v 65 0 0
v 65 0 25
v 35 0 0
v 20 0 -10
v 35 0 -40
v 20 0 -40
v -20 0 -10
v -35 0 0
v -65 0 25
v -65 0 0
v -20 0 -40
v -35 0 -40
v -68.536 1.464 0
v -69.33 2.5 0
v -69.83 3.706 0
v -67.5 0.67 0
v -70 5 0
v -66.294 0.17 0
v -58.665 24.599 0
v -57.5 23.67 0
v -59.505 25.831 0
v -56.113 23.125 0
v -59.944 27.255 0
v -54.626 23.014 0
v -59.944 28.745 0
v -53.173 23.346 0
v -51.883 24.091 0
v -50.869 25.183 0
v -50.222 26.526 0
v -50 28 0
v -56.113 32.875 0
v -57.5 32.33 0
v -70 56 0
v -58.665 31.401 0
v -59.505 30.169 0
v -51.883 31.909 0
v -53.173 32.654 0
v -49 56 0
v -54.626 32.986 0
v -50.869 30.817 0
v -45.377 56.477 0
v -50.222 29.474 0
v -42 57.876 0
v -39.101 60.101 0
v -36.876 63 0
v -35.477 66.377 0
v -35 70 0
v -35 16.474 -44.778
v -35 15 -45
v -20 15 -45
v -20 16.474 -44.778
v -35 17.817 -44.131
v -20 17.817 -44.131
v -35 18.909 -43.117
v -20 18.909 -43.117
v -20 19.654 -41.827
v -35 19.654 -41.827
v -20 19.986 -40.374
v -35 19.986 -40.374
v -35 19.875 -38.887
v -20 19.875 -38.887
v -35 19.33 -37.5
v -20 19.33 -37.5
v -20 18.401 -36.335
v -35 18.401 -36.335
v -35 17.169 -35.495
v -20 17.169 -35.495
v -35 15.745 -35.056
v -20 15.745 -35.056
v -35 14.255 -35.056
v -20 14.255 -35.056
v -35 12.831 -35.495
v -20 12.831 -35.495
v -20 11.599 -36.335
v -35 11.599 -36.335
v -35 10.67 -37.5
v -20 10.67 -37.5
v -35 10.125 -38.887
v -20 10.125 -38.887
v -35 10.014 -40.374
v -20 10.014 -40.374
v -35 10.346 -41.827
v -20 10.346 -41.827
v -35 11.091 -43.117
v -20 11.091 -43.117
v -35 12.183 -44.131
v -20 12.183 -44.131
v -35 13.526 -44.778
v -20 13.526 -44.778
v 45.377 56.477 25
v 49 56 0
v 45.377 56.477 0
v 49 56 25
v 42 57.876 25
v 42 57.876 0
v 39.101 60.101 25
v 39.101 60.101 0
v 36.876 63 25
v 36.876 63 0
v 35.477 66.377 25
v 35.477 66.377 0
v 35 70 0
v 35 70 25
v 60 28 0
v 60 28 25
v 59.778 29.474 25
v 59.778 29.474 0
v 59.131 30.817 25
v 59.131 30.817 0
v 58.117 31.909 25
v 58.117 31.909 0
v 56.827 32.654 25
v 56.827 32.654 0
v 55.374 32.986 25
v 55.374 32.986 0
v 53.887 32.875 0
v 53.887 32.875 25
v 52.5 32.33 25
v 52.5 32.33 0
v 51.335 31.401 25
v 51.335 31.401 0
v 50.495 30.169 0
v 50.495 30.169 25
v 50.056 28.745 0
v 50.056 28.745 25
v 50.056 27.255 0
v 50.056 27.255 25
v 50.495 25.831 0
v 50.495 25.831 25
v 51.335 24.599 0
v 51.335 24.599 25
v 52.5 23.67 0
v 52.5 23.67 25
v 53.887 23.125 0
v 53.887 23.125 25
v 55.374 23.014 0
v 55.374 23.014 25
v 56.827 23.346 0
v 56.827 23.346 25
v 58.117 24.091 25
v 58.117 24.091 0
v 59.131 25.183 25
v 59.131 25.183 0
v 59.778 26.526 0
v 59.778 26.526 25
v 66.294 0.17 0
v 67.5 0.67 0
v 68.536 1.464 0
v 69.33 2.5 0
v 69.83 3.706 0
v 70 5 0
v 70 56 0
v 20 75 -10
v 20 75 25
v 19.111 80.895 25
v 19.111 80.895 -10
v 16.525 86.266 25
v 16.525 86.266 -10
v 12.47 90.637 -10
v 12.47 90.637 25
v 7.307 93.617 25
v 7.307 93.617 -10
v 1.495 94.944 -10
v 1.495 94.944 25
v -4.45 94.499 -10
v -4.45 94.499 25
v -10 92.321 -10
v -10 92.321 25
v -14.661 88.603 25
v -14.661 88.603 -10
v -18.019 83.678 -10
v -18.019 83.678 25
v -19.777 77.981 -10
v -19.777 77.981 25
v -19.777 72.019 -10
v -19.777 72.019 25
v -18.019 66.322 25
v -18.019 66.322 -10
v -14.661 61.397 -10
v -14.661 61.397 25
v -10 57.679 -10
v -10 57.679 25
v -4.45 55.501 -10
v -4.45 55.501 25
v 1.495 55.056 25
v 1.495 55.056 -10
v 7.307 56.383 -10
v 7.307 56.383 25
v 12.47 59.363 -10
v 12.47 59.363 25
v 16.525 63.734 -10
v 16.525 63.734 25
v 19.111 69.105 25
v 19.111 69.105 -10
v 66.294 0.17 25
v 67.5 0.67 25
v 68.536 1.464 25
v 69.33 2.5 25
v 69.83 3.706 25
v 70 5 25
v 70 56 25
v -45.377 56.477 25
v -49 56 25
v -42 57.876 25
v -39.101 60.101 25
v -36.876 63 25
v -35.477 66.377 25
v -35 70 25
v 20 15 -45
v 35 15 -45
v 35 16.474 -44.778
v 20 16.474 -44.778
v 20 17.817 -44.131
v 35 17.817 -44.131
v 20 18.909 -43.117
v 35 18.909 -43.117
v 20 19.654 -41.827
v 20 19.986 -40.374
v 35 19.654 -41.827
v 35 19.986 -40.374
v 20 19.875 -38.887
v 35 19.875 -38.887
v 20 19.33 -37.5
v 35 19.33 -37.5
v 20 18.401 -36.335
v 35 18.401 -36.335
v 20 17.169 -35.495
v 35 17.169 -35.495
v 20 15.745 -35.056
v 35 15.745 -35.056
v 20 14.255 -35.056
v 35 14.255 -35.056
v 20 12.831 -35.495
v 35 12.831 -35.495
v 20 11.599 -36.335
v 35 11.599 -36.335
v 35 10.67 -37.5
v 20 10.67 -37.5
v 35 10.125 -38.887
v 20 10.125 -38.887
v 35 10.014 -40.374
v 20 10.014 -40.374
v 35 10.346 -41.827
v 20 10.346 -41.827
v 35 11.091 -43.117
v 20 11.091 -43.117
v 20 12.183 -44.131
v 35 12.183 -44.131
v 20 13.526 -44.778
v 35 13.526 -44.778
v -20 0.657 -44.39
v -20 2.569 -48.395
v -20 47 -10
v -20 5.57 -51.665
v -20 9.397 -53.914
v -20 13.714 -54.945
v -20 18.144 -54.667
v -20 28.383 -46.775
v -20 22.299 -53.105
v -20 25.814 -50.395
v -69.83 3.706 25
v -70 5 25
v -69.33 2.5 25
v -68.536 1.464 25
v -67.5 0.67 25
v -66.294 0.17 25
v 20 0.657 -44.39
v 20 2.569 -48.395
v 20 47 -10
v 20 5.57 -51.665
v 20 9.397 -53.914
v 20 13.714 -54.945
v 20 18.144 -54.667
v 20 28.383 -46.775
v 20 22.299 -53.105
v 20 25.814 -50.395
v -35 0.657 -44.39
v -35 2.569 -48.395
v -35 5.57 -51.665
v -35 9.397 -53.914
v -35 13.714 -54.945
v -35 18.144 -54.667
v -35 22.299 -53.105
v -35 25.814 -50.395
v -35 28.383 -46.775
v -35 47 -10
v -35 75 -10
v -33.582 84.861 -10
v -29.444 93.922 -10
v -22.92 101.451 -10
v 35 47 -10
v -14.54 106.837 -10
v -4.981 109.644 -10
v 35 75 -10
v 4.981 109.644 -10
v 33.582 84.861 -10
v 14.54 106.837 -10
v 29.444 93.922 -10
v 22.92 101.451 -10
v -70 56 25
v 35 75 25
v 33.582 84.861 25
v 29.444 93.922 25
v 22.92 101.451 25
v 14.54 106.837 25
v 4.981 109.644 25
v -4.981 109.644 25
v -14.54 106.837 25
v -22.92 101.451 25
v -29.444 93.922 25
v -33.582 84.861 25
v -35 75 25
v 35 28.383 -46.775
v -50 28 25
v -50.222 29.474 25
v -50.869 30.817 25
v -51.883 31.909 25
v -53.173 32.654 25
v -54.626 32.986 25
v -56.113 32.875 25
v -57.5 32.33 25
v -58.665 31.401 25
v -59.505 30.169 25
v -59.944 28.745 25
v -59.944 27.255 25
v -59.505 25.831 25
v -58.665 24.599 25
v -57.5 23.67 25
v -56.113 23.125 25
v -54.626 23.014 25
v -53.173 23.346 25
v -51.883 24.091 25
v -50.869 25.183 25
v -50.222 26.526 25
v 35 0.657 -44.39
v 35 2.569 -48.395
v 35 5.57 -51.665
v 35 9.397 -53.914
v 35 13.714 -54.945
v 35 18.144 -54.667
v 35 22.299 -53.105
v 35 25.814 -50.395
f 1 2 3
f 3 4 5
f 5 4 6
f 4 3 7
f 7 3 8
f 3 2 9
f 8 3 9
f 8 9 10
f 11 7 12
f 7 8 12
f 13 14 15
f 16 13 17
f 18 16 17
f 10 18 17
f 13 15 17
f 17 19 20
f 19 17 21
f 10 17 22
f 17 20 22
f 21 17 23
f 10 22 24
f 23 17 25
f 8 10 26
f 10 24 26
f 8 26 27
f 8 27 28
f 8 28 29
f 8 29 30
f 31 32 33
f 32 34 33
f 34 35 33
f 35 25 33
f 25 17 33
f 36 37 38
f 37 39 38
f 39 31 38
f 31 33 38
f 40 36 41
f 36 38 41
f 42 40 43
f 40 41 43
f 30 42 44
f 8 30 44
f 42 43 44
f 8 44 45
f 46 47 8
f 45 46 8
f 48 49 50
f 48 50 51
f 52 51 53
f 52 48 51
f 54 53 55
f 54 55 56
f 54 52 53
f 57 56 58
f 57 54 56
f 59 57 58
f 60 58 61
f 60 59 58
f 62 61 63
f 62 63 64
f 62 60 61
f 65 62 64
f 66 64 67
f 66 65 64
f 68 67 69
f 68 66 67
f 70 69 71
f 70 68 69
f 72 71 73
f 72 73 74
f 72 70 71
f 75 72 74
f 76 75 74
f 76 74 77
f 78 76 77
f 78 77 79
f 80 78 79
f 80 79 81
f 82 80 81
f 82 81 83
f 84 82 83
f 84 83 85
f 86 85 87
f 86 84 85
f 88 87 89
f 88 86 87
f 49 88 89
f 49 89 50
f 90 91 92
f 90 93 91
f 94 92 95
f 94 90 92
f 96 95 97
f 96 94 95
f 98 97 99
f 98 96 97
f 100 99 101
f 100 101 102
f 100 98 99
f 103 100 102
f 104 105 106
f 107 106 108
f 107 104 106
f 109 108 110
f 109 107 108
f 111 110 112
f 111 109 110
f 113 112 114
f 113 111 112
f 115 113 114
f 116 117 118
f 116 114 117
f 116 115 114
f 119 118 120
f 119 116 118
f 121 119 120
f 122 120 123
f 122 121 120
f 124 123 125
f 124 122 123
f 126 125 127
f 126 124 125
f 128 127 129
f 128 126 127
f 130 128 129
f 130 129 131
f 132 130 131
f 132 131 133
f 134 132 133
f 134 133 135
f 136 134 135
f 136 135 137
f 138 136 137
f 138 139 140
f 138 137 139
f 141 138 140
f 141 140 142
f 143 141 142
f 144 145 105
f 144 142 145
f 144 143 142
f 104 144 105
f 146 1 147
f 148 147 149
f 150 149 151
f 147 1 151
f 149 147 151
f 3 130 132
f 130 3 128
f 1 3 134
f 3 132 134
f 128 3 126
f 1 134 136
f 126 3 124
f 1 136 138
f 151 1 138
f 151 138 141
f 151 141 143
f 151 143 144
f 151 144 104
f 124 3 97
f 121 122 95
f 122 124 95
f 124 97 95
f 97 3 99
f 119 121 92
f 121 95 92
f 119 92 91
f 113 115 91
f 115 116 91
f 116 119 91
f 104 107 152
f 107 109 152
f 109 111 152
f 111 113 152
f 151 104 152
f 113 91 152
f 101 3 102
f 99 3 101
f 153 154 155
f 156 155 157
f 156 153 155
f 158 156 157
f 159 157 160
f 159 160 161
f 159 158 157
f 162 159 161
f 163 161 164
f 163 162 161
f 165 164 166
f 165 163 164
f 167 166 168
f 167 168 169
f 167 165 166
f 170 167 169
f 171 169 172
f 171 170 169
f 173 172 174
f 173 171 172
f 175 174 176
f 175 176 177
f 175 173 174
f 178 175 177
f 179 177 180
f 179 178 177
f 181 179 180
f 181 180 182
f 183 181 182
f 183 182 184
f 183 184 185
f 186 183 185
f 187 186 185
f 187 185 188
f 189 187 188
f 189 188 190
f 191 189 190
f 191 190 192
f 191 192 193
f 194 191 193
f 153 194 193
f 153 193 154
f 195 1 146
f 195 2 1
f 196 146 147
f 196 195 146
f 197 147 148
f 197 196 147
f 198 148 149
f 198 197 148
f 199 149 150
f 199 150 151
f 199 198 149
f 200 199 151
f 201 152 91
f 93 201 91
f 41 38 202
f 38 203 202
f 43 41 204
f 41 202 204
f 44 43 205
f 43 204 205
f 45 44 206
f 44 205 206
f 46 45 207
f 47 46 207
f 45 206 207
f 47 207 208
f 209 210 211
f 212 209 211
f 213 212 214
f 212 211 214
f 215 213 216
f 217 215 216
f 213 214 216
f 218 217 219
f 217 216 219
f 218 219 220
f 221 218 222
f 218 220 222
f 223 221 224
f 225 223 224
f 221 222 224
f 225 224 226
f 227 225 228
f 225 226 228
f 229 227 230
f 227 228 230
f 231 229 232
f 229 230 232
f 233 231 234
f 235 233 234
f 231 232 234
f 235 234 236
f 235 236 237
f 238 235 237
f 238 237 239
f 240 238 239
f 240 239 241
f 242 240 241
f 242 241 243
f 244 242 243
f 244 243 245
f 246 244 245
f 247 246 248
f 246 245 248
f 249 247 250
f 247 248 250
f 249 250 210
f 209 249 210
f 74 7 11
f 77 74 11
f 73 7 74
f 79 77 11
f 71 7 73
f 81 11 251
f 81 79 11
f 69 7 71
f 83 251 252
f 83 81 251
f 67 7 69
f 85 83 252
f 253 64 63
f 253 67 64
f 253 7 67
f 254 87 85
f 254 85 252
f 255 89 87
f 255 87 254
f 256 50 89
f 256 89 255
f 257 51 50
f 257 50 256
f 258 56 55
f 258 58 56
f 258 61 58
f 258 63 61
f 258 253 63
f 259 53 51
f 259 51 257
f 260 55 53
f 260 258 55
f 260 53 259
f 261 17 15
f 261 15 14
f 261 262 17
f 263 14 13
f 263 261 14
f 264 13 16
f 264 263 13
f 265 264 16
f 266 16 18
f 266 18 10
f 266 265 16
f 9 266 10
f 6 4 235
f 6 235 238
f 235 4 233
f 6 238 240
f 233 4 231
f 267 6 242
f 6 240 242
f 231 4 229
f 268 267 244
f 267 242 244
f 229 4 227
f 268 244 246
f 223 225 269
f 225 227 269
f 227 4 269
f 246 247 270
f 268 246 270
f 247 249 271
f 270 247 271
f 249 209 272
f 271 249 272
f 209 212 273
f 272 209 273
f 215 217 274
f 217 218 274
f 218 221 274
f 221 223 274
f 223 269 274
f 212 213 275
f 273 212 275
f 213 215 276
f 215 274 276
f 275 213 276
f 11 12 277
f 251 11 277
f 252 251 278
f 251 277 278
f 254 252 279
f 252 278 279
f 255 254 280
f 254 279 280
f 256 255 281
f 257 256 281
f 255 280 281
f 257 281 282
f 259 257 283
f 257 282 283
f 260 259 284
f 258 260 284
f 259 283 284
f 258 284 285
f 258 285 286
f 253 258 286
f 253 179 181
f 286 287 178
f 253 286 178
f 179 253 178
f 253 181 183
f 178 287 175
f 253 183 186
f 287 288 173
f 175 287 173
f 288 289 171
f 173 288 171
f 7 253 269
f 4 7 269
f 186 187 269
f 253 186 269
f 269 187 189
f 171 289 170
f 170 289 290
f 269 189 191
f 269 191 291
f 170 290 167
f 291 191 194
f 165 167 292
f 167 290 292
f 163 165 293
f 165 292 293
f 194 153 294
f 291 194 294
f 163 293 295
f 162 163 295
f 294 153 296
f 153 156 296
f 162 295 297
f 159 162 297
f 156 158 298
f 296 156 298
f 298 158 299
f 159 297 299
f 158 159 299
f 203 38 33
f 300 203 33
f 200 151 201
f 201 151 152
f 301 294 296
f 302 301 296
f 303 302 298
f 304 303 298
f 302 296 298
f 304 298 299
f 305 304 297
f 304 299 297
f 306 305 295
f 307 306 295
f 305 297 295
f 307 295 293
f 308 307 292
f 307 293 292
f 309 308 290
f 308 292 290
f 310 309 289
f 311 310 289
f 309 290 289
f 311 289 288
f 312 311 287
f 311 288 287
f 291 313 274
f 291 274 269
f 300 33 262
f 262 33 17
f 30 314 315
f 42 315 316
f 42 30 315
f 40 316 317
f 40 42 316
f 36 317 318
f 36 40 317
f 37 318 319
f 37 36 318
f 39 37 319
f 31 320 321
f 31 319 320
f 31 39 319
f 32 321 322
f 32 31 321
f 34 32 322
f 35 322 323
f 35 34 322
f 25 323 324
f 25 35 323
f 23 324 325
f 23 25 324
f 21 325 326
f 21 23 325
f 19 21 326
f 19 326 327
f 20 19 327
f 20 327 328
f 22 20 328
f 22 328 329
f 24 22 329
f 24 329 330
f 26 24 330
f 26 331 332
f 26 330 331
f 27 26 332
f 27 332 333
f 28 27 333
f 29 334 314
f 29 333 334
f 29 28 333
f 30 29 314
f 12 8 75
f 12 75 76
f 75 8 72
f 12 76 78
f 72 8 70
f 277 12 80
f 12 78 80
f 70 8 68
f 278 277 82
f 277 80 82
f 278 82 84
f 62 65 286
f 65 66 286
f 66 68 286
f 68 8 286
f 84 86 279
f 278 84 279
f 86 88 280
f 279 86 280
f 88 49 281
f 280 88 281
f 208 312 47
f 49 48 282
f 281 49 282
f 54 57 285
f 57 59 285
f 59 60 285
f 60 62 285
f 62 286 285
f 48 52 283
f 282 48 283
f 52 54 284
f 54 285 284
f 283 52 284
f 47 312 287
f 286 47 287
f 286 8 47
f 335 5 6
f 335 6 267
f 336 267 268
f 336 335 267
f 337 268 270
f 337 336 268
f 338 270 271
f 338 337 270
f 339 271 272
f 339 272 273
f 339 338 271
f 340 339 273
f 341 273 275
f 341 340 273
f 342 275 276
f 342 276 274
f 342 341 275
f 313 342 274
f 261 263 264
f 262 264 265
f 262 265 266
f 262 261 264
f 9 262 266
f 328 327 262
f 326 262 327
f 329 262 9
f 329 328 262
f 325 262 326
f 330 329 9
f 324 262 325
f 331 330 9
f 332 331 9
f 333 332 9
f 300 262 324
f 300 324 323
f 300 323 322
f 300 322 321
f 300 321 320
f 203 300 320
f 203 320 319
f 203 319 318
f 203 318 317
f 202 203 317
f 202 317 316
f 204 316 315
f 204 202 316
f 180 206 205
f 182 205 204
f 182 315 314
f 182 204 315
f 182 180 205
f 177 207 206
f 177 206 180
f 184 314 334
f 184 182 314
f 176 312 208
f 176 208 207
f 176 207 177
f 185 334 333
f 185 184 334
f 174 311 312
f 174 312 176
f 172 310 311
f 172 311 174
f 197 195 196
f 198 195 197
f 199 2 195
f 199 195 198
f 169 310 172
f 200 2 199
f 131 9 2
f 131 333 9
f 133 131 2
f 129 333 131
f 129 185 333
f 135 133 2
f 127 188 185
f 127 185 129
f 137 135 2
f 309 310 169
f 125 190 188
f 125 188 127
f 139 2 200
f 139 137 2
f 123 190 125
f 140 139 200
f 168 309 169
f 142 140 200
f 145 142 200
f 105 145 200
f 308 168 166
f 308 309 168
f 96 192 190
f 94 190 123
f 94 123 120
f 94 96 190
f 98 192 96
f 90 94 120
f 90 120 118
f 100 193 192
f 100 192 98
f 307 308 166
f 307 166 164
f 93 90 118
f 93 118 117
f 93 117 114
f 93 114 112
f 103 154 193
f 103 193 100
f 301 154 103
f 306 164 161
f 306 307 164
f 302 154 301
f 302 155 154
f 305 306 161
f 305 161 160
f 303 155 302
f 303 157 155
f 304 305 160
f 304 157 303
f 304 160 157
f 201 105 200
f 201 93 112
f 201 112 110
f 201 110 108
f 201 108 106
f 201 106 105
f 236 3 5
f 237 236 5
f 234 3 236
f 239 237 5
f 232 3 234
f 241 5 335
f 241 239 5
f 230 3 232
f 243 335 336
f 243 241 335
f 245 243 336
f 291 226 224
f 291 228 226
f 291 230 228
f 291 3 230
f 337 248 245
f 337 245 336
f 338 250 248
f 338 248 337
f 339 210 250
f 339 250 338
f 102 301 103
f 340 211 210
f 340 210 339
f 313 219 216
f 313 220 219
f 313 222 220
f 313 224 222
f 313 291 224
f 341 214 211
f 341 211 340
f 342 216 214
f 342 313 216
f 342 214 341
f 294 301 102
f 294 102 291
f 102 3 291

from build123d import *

# Parameters (mm, degrees)
SKETCH1_R           = 5
SKETCH1_R_2         = 20
BOSS_EXTRUDE1_DEPTH = 25
FILLET1_R           = 14
FILLET2_R           = 5
BOSS_EXTRUDE2_START = -10
SKETCH1_3_R         = 20
BOSS_EXTRUDE2_DEPTH = 10
SKETCH3_R           = 5
BOSS_EXTRUDE3_DEPTH = 15


with BuildPart() as part:
    # Sketch1 → Boss-Extrude1 (new body)
    with BuildSketch(Plane.XY):
        with BuildLine():
            Line((-70, 56), (-70, 0))
            Line((-70, 0), (70, 0))
            Line((70, 0), (70, 56))
            Line((70, 56), (35, 56))
            Line((35, 56), (35, 75))
            ThreePointArc((35, 75), (0, 110), (-35, 75))
            Line((-35, 75), (-35, 56))
            Line((-35, 56), (-70, 56))
        make_face()
        with Locations((-55, 28)):
            Circle(SKETCH1_R, mode=Mode.SUBTRACT)
        with Locations((0, 75)):
            Circle(SKETCH1_R_2, mode=Mode.SUBTRACT)
        with Locations((55, 28)):
            Circle(SKETCH1_R, mode=Mode.SUBTRACT)
    extrude(amount=BOSS_EXTRUDE1_DEPTH)

    # Fillet1
    fillet1_edges = [part.edges().sort_by_distance(p)[0] for p in [
        (-35, 56, 12.5),
        (35, 56, 12.5),
    ]]
    fillet(fillet1_edges, radius=FILLET1_R)

    # Fillet2
    fillet2_edges = [part.edges().sort_by_distance(p)[0] for p in [
        (-70, 0, 12.5),
        (70, 0, 12.5),
    ]]
    fillet(fillet2_edges, radius=FILLET2_R)

    # Sketch1_3 → Boss-Extrude2 (add)
    with BuildSketch(Plane.XY.offset(BOSS_EXTRUDE2_START)):
        with BuildLine():
            Line((-35, 56), (-35, 0))
            Line((-35, 0), (35, 0))
            Line((35, 0), (35, 56))
            Line((35, 56), (35, 75))
            ThreePointArc((35, 75), (0, 110), (-35, 75))
            Line((-35, 75), (-35, 56))
        make_face()
        with Locations((0, 75)):
            Circle(SKETCH1_3_R, mode=Mode.SUBTRACT)
    extrude(amount=BOSS_EXTRUDE2_DEPTH)

    # Sketch3 → Boss-Extrude3 (add)
    with BuildSketch(Plane(origin=(35, 0, 0), x_dir=(0, 0, -1), z_dir=(1, 0, 0))):
        with BuildLine():
            Line((10, 47), (10, 0))
            Line((10, 0), (40, 0))
            ThreePointArc((40, 0), (54.590100754, 11.517334354), (46.774992355, 28.382805333))
            Line((46.774992355, 28.382805333), (10, 47))
        make_face()
        with Locations((40, 15)):
            Circle(SKETCH3_R, mode=Mode.SUBTRACT)
    extrude(amount=-BOSS_EXTRUDE3_DEPTH)

    # Mirror1: part across plane


with BuildPart() as part_1:
    add(part.part)
    add(part.part.mirror(Plane(origin=(0, 0, 0), x_dir=(0, 0, 1), z_dir=(1, 0, 0))))


solid = part_1.part
